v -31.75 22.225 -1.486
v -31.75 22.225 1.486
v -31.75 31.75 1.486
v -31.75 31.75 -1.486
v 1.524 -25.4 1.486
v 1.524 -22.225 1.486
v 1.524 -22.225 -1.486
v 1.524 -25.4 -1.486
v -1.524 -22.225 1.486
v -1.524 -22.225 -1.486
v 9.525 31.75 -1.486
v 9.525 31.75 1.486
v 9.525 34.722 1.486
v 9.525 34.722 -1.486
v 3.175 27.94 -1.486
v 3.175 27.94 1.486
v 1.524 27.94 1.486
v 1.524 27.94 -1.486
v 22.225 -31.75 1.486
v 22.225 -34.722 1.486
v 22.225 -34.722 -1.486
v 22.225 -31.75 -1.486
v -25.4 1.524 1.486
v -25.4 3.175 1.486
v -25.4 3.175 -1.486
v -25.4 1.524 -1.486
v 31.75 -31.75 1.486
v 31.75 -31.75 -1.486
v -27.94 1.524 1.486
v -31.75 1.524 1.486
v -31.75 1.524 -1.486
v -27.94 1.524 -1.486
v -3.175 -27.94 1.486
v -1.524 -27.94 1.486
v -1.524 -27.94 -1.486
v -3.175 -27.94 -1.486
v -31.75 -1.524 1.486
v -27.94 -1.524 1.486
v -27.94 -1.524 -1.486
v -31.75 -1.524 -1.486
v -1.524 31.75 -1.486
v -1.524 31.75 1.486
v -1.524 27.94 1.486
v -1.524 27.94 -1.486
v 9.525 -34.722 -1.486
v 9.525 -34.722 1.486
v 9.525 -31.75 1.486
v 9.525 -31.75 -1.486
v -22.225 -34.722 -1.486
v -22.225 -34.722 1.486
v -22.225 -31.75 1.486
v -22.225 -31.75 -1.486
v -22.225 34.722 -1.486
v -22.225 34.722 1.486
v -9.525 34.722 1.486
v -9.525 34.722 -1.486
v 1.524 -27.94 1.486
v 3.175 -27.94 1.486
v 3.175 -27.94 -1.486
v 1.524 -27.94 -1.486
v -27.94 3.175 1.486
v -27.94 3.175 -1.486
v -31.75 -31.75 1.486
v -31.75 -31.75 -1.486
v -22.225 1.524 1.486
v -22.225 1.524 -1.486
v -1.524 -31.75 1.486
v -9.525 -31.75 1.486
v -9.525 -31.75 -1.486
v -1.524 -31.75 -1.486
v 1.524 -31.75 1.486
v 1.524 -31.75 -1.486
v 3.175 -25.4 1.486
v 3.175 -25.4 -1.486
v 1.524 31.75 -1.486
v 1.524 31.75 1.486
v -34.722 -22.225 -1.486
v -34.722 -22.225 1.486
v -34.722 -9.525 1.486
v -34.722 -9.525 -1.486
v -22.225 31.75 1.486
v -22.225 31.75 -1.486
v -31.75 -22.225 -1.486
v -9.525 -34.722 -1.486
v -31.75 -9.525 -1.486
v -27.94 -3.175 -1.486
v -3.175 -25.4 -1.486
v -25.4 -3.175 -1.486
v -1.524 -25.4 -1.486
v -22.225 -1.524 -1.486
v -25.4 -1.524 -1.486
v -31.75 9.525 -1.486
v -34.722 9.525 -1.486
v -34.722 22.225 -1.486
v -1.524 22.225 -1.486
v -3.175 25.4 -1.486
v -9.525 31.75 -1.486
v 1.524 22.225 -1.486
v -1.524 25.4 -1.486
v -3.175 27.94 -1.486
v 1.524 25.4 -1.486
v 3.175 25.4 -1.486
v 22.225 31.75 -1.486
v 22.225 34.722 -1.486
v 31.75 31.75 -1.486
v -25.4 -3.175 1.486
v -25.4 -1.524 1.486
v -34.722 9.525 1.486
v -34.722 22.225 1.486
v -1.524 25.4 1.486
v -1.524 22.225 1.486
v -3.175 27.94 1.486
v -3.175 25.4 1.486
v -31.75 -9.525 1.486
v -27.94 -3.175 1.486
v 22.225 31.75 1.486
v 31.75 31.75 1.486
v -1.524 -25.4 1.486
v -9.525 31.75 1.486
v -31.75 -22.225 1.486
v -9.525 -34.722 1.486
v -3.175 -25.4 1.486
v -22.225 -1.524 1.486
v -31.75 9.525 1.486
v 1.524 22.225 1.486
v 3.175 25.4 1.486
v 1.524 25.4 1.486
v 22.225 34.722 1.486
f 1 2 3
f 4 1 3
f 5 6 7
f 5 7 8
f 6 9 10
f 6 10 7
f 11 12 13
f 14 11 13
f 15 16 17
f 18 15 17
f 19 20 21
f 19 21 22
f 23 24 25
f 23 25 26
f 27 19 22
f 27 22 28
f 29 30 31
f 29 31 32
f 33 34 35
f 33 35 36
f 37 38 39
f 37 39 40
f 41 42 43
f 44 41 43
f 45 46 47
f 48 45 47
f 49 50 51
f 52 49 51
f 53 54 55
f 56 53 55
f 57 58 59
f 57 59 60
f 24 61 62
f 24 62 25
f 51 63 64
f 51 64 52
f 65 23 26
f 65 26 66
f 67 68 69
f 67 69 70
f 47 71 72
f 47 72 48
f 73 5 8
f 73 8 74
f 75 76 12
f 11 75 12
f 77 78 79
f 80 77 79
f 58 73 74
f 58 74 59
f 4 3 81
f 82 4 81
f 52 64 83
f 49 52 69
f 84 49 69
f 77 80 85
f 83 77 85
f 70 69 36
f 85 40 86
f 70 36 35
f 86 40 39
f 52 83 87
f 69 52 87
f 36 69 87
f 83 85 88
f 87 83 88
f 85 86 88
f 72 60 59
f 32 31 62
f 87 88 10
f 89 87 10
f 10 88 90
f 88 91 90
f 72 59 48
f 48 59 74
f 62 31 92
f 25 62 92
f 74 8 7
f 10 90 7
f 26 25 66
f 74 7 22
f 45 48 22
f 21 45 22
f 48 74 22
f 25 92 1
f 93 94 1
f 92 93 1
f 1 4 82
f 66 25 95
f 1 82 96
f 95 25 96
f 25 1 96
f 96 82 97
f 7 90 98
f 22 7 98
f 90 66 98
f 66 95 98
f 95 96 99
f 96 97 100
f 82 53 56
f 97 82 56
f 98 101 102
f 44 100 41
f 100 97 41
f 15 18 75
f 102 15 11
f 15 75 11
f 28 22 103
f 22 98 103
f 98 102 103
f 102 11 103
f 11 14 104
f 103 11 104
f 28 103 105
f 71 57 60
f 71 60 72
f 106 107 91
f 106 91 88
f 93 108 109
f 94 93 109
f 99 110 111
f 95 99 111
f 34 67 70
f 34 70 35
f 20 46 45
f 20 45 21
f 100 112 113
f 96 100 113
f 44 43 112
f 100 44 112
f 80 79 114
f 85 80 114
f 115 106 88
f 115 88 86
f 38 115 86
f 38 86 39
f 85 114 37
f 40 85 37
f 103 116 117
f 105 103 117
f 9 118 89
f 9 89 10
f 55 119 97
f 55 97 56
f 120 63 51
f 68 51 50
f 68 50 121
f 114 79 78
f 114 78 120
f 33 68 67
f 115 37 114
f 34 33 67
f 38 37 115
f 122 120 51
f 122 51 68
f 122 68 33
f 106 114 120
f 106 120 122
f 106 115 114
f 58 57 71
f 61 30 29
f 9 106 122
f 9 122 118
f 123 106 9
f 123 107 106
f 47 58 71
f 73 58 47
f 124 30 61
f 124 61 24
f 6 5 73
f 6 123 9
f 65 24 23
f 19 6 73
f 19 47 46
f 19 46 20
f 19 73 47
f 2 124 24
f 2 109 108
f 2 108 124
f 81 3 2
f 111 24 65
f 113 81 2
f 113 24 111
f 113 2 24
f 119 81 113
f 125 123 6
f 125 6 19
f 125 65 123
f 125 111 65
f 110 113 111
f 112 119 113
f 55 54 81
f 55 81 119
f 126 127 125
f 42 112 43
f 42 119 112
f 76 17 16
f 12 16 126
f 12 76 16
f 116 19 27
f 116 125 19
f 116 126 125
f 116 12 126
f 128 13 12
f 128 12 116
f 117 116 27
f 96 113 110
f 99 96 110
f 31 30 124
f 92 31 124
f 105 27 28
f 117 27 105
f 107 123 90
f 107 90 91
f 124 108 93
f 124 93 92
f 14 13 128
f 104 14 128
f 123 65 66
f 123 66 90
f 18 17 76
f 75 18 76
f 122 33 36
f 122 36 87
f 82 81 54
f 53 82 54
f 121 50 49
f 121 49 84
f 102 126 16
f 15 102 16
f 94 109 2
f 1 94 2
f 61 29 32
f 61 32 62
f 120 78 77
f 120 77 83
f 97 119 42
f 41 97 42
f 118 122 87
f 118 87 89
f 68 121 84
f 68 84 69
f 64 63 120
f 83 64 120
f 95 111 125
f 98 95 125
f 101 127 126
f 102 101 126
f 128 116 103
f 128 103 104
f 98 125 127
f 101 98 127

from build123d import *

# Parameters (mm, degrees)
SKETCH1_W           = 63.5
SKETCH1_H           = 63.5
BOSS_EXTRUDE1_DEPTH = 1.4859
CUT_EXTRUDE1_DEPTH  = 45.999517722
SKETCH3_W           = 12.7
SKETCH3_H           = 2.9718
SKETCH3_W_2         = 2.9718
SKETCH3_H_2         = 12.7
BOSS_EXTRUDE2_DEPTH = 2.9718


with BuildPart() as part:
    # Sketch1 → Boss-Extrude1 (new, symmetric)
    with BuildSketch(Plane.XY):
        Rectangle(SKETCH1_W, SKETCH1_H)
    extrude(amount=BOSS_EXTRUDE1_DEPTH, both=True)

    # Sketch2 → Cut-Extrude1 (cut, through all)
    with BuildSketch(Plane.XY.offset(1.4859)):
        Polygon((-1.524, -31.75), (-1.524, -27.94), (-3.175, -27.94), (-3.175, -25.4), (-1.524, -25.4), (-1.524, -22.225), (1.524, -22.225), (1.524, -25.4), (3.175, -25.4), (3.175, -27.94), (1.524, -27.94), (1.524, -31.75), align=None)
        Polygon((-31.75, 1.524), (-27.94, 1.524), (-27.94, 3.175), (-25.4, 3.175), (-25.4, 1.524), (-22.225, 1.524), (-22.225, -1.524), (-25.4, -1.524), (-25.4, -3.175), (-27.94, -3.175), (-27.94, -1.524), (-31.75, -1.524), align=None)
        Polygon((-1.524, 31.75), (-1.524, 27.94), (-3.175, 27.94), (-3.175, 25.4), (-1.524, 25.4), (-1.524, 22.225), (1.524, 22.225), (1.524, 25.4), (3.175, 25.4), (3.175, 27.94), (1.524, 27.94), (1.524, 31.75), align=None)
    extrude(amount=-CUT_EXTRUDE1_DEPTH, mode=Mode.SUBTRACT)

    # Sketch3 → Boss-Extrude2 (add)
    with BuildSketch(Plane.XY.offset(1.4859)):
        with Locations((-15.875, -33.2359)):
            Rectangle(SKETCH3_W, SKETCH3_H)
        with Locations((15.875, -33.2359)):
            Rectangle(SKETCH3_W, SKETCH3_H)
        with Locations((-33.2359, 15.875)):
            Rectangle(SKETCH3_W_2, SKETCH3_H_2)
        with Locations((-33.2359, -15.875)):
            Rectangle(SKETCH3_W_2, SKETCH3_H_2)
        with Locations((15.875, 33.2359)):
            Rectangle(SKETCH3_W, SKETCH3_H)
        with Locations((-15.875, 33.2359)):
            Rectangle(SKETCH3_W, SKETCH3_H)
    extrude(amount=-BOSS_EXTRUDE2_DEPTH)


solid = part.part
